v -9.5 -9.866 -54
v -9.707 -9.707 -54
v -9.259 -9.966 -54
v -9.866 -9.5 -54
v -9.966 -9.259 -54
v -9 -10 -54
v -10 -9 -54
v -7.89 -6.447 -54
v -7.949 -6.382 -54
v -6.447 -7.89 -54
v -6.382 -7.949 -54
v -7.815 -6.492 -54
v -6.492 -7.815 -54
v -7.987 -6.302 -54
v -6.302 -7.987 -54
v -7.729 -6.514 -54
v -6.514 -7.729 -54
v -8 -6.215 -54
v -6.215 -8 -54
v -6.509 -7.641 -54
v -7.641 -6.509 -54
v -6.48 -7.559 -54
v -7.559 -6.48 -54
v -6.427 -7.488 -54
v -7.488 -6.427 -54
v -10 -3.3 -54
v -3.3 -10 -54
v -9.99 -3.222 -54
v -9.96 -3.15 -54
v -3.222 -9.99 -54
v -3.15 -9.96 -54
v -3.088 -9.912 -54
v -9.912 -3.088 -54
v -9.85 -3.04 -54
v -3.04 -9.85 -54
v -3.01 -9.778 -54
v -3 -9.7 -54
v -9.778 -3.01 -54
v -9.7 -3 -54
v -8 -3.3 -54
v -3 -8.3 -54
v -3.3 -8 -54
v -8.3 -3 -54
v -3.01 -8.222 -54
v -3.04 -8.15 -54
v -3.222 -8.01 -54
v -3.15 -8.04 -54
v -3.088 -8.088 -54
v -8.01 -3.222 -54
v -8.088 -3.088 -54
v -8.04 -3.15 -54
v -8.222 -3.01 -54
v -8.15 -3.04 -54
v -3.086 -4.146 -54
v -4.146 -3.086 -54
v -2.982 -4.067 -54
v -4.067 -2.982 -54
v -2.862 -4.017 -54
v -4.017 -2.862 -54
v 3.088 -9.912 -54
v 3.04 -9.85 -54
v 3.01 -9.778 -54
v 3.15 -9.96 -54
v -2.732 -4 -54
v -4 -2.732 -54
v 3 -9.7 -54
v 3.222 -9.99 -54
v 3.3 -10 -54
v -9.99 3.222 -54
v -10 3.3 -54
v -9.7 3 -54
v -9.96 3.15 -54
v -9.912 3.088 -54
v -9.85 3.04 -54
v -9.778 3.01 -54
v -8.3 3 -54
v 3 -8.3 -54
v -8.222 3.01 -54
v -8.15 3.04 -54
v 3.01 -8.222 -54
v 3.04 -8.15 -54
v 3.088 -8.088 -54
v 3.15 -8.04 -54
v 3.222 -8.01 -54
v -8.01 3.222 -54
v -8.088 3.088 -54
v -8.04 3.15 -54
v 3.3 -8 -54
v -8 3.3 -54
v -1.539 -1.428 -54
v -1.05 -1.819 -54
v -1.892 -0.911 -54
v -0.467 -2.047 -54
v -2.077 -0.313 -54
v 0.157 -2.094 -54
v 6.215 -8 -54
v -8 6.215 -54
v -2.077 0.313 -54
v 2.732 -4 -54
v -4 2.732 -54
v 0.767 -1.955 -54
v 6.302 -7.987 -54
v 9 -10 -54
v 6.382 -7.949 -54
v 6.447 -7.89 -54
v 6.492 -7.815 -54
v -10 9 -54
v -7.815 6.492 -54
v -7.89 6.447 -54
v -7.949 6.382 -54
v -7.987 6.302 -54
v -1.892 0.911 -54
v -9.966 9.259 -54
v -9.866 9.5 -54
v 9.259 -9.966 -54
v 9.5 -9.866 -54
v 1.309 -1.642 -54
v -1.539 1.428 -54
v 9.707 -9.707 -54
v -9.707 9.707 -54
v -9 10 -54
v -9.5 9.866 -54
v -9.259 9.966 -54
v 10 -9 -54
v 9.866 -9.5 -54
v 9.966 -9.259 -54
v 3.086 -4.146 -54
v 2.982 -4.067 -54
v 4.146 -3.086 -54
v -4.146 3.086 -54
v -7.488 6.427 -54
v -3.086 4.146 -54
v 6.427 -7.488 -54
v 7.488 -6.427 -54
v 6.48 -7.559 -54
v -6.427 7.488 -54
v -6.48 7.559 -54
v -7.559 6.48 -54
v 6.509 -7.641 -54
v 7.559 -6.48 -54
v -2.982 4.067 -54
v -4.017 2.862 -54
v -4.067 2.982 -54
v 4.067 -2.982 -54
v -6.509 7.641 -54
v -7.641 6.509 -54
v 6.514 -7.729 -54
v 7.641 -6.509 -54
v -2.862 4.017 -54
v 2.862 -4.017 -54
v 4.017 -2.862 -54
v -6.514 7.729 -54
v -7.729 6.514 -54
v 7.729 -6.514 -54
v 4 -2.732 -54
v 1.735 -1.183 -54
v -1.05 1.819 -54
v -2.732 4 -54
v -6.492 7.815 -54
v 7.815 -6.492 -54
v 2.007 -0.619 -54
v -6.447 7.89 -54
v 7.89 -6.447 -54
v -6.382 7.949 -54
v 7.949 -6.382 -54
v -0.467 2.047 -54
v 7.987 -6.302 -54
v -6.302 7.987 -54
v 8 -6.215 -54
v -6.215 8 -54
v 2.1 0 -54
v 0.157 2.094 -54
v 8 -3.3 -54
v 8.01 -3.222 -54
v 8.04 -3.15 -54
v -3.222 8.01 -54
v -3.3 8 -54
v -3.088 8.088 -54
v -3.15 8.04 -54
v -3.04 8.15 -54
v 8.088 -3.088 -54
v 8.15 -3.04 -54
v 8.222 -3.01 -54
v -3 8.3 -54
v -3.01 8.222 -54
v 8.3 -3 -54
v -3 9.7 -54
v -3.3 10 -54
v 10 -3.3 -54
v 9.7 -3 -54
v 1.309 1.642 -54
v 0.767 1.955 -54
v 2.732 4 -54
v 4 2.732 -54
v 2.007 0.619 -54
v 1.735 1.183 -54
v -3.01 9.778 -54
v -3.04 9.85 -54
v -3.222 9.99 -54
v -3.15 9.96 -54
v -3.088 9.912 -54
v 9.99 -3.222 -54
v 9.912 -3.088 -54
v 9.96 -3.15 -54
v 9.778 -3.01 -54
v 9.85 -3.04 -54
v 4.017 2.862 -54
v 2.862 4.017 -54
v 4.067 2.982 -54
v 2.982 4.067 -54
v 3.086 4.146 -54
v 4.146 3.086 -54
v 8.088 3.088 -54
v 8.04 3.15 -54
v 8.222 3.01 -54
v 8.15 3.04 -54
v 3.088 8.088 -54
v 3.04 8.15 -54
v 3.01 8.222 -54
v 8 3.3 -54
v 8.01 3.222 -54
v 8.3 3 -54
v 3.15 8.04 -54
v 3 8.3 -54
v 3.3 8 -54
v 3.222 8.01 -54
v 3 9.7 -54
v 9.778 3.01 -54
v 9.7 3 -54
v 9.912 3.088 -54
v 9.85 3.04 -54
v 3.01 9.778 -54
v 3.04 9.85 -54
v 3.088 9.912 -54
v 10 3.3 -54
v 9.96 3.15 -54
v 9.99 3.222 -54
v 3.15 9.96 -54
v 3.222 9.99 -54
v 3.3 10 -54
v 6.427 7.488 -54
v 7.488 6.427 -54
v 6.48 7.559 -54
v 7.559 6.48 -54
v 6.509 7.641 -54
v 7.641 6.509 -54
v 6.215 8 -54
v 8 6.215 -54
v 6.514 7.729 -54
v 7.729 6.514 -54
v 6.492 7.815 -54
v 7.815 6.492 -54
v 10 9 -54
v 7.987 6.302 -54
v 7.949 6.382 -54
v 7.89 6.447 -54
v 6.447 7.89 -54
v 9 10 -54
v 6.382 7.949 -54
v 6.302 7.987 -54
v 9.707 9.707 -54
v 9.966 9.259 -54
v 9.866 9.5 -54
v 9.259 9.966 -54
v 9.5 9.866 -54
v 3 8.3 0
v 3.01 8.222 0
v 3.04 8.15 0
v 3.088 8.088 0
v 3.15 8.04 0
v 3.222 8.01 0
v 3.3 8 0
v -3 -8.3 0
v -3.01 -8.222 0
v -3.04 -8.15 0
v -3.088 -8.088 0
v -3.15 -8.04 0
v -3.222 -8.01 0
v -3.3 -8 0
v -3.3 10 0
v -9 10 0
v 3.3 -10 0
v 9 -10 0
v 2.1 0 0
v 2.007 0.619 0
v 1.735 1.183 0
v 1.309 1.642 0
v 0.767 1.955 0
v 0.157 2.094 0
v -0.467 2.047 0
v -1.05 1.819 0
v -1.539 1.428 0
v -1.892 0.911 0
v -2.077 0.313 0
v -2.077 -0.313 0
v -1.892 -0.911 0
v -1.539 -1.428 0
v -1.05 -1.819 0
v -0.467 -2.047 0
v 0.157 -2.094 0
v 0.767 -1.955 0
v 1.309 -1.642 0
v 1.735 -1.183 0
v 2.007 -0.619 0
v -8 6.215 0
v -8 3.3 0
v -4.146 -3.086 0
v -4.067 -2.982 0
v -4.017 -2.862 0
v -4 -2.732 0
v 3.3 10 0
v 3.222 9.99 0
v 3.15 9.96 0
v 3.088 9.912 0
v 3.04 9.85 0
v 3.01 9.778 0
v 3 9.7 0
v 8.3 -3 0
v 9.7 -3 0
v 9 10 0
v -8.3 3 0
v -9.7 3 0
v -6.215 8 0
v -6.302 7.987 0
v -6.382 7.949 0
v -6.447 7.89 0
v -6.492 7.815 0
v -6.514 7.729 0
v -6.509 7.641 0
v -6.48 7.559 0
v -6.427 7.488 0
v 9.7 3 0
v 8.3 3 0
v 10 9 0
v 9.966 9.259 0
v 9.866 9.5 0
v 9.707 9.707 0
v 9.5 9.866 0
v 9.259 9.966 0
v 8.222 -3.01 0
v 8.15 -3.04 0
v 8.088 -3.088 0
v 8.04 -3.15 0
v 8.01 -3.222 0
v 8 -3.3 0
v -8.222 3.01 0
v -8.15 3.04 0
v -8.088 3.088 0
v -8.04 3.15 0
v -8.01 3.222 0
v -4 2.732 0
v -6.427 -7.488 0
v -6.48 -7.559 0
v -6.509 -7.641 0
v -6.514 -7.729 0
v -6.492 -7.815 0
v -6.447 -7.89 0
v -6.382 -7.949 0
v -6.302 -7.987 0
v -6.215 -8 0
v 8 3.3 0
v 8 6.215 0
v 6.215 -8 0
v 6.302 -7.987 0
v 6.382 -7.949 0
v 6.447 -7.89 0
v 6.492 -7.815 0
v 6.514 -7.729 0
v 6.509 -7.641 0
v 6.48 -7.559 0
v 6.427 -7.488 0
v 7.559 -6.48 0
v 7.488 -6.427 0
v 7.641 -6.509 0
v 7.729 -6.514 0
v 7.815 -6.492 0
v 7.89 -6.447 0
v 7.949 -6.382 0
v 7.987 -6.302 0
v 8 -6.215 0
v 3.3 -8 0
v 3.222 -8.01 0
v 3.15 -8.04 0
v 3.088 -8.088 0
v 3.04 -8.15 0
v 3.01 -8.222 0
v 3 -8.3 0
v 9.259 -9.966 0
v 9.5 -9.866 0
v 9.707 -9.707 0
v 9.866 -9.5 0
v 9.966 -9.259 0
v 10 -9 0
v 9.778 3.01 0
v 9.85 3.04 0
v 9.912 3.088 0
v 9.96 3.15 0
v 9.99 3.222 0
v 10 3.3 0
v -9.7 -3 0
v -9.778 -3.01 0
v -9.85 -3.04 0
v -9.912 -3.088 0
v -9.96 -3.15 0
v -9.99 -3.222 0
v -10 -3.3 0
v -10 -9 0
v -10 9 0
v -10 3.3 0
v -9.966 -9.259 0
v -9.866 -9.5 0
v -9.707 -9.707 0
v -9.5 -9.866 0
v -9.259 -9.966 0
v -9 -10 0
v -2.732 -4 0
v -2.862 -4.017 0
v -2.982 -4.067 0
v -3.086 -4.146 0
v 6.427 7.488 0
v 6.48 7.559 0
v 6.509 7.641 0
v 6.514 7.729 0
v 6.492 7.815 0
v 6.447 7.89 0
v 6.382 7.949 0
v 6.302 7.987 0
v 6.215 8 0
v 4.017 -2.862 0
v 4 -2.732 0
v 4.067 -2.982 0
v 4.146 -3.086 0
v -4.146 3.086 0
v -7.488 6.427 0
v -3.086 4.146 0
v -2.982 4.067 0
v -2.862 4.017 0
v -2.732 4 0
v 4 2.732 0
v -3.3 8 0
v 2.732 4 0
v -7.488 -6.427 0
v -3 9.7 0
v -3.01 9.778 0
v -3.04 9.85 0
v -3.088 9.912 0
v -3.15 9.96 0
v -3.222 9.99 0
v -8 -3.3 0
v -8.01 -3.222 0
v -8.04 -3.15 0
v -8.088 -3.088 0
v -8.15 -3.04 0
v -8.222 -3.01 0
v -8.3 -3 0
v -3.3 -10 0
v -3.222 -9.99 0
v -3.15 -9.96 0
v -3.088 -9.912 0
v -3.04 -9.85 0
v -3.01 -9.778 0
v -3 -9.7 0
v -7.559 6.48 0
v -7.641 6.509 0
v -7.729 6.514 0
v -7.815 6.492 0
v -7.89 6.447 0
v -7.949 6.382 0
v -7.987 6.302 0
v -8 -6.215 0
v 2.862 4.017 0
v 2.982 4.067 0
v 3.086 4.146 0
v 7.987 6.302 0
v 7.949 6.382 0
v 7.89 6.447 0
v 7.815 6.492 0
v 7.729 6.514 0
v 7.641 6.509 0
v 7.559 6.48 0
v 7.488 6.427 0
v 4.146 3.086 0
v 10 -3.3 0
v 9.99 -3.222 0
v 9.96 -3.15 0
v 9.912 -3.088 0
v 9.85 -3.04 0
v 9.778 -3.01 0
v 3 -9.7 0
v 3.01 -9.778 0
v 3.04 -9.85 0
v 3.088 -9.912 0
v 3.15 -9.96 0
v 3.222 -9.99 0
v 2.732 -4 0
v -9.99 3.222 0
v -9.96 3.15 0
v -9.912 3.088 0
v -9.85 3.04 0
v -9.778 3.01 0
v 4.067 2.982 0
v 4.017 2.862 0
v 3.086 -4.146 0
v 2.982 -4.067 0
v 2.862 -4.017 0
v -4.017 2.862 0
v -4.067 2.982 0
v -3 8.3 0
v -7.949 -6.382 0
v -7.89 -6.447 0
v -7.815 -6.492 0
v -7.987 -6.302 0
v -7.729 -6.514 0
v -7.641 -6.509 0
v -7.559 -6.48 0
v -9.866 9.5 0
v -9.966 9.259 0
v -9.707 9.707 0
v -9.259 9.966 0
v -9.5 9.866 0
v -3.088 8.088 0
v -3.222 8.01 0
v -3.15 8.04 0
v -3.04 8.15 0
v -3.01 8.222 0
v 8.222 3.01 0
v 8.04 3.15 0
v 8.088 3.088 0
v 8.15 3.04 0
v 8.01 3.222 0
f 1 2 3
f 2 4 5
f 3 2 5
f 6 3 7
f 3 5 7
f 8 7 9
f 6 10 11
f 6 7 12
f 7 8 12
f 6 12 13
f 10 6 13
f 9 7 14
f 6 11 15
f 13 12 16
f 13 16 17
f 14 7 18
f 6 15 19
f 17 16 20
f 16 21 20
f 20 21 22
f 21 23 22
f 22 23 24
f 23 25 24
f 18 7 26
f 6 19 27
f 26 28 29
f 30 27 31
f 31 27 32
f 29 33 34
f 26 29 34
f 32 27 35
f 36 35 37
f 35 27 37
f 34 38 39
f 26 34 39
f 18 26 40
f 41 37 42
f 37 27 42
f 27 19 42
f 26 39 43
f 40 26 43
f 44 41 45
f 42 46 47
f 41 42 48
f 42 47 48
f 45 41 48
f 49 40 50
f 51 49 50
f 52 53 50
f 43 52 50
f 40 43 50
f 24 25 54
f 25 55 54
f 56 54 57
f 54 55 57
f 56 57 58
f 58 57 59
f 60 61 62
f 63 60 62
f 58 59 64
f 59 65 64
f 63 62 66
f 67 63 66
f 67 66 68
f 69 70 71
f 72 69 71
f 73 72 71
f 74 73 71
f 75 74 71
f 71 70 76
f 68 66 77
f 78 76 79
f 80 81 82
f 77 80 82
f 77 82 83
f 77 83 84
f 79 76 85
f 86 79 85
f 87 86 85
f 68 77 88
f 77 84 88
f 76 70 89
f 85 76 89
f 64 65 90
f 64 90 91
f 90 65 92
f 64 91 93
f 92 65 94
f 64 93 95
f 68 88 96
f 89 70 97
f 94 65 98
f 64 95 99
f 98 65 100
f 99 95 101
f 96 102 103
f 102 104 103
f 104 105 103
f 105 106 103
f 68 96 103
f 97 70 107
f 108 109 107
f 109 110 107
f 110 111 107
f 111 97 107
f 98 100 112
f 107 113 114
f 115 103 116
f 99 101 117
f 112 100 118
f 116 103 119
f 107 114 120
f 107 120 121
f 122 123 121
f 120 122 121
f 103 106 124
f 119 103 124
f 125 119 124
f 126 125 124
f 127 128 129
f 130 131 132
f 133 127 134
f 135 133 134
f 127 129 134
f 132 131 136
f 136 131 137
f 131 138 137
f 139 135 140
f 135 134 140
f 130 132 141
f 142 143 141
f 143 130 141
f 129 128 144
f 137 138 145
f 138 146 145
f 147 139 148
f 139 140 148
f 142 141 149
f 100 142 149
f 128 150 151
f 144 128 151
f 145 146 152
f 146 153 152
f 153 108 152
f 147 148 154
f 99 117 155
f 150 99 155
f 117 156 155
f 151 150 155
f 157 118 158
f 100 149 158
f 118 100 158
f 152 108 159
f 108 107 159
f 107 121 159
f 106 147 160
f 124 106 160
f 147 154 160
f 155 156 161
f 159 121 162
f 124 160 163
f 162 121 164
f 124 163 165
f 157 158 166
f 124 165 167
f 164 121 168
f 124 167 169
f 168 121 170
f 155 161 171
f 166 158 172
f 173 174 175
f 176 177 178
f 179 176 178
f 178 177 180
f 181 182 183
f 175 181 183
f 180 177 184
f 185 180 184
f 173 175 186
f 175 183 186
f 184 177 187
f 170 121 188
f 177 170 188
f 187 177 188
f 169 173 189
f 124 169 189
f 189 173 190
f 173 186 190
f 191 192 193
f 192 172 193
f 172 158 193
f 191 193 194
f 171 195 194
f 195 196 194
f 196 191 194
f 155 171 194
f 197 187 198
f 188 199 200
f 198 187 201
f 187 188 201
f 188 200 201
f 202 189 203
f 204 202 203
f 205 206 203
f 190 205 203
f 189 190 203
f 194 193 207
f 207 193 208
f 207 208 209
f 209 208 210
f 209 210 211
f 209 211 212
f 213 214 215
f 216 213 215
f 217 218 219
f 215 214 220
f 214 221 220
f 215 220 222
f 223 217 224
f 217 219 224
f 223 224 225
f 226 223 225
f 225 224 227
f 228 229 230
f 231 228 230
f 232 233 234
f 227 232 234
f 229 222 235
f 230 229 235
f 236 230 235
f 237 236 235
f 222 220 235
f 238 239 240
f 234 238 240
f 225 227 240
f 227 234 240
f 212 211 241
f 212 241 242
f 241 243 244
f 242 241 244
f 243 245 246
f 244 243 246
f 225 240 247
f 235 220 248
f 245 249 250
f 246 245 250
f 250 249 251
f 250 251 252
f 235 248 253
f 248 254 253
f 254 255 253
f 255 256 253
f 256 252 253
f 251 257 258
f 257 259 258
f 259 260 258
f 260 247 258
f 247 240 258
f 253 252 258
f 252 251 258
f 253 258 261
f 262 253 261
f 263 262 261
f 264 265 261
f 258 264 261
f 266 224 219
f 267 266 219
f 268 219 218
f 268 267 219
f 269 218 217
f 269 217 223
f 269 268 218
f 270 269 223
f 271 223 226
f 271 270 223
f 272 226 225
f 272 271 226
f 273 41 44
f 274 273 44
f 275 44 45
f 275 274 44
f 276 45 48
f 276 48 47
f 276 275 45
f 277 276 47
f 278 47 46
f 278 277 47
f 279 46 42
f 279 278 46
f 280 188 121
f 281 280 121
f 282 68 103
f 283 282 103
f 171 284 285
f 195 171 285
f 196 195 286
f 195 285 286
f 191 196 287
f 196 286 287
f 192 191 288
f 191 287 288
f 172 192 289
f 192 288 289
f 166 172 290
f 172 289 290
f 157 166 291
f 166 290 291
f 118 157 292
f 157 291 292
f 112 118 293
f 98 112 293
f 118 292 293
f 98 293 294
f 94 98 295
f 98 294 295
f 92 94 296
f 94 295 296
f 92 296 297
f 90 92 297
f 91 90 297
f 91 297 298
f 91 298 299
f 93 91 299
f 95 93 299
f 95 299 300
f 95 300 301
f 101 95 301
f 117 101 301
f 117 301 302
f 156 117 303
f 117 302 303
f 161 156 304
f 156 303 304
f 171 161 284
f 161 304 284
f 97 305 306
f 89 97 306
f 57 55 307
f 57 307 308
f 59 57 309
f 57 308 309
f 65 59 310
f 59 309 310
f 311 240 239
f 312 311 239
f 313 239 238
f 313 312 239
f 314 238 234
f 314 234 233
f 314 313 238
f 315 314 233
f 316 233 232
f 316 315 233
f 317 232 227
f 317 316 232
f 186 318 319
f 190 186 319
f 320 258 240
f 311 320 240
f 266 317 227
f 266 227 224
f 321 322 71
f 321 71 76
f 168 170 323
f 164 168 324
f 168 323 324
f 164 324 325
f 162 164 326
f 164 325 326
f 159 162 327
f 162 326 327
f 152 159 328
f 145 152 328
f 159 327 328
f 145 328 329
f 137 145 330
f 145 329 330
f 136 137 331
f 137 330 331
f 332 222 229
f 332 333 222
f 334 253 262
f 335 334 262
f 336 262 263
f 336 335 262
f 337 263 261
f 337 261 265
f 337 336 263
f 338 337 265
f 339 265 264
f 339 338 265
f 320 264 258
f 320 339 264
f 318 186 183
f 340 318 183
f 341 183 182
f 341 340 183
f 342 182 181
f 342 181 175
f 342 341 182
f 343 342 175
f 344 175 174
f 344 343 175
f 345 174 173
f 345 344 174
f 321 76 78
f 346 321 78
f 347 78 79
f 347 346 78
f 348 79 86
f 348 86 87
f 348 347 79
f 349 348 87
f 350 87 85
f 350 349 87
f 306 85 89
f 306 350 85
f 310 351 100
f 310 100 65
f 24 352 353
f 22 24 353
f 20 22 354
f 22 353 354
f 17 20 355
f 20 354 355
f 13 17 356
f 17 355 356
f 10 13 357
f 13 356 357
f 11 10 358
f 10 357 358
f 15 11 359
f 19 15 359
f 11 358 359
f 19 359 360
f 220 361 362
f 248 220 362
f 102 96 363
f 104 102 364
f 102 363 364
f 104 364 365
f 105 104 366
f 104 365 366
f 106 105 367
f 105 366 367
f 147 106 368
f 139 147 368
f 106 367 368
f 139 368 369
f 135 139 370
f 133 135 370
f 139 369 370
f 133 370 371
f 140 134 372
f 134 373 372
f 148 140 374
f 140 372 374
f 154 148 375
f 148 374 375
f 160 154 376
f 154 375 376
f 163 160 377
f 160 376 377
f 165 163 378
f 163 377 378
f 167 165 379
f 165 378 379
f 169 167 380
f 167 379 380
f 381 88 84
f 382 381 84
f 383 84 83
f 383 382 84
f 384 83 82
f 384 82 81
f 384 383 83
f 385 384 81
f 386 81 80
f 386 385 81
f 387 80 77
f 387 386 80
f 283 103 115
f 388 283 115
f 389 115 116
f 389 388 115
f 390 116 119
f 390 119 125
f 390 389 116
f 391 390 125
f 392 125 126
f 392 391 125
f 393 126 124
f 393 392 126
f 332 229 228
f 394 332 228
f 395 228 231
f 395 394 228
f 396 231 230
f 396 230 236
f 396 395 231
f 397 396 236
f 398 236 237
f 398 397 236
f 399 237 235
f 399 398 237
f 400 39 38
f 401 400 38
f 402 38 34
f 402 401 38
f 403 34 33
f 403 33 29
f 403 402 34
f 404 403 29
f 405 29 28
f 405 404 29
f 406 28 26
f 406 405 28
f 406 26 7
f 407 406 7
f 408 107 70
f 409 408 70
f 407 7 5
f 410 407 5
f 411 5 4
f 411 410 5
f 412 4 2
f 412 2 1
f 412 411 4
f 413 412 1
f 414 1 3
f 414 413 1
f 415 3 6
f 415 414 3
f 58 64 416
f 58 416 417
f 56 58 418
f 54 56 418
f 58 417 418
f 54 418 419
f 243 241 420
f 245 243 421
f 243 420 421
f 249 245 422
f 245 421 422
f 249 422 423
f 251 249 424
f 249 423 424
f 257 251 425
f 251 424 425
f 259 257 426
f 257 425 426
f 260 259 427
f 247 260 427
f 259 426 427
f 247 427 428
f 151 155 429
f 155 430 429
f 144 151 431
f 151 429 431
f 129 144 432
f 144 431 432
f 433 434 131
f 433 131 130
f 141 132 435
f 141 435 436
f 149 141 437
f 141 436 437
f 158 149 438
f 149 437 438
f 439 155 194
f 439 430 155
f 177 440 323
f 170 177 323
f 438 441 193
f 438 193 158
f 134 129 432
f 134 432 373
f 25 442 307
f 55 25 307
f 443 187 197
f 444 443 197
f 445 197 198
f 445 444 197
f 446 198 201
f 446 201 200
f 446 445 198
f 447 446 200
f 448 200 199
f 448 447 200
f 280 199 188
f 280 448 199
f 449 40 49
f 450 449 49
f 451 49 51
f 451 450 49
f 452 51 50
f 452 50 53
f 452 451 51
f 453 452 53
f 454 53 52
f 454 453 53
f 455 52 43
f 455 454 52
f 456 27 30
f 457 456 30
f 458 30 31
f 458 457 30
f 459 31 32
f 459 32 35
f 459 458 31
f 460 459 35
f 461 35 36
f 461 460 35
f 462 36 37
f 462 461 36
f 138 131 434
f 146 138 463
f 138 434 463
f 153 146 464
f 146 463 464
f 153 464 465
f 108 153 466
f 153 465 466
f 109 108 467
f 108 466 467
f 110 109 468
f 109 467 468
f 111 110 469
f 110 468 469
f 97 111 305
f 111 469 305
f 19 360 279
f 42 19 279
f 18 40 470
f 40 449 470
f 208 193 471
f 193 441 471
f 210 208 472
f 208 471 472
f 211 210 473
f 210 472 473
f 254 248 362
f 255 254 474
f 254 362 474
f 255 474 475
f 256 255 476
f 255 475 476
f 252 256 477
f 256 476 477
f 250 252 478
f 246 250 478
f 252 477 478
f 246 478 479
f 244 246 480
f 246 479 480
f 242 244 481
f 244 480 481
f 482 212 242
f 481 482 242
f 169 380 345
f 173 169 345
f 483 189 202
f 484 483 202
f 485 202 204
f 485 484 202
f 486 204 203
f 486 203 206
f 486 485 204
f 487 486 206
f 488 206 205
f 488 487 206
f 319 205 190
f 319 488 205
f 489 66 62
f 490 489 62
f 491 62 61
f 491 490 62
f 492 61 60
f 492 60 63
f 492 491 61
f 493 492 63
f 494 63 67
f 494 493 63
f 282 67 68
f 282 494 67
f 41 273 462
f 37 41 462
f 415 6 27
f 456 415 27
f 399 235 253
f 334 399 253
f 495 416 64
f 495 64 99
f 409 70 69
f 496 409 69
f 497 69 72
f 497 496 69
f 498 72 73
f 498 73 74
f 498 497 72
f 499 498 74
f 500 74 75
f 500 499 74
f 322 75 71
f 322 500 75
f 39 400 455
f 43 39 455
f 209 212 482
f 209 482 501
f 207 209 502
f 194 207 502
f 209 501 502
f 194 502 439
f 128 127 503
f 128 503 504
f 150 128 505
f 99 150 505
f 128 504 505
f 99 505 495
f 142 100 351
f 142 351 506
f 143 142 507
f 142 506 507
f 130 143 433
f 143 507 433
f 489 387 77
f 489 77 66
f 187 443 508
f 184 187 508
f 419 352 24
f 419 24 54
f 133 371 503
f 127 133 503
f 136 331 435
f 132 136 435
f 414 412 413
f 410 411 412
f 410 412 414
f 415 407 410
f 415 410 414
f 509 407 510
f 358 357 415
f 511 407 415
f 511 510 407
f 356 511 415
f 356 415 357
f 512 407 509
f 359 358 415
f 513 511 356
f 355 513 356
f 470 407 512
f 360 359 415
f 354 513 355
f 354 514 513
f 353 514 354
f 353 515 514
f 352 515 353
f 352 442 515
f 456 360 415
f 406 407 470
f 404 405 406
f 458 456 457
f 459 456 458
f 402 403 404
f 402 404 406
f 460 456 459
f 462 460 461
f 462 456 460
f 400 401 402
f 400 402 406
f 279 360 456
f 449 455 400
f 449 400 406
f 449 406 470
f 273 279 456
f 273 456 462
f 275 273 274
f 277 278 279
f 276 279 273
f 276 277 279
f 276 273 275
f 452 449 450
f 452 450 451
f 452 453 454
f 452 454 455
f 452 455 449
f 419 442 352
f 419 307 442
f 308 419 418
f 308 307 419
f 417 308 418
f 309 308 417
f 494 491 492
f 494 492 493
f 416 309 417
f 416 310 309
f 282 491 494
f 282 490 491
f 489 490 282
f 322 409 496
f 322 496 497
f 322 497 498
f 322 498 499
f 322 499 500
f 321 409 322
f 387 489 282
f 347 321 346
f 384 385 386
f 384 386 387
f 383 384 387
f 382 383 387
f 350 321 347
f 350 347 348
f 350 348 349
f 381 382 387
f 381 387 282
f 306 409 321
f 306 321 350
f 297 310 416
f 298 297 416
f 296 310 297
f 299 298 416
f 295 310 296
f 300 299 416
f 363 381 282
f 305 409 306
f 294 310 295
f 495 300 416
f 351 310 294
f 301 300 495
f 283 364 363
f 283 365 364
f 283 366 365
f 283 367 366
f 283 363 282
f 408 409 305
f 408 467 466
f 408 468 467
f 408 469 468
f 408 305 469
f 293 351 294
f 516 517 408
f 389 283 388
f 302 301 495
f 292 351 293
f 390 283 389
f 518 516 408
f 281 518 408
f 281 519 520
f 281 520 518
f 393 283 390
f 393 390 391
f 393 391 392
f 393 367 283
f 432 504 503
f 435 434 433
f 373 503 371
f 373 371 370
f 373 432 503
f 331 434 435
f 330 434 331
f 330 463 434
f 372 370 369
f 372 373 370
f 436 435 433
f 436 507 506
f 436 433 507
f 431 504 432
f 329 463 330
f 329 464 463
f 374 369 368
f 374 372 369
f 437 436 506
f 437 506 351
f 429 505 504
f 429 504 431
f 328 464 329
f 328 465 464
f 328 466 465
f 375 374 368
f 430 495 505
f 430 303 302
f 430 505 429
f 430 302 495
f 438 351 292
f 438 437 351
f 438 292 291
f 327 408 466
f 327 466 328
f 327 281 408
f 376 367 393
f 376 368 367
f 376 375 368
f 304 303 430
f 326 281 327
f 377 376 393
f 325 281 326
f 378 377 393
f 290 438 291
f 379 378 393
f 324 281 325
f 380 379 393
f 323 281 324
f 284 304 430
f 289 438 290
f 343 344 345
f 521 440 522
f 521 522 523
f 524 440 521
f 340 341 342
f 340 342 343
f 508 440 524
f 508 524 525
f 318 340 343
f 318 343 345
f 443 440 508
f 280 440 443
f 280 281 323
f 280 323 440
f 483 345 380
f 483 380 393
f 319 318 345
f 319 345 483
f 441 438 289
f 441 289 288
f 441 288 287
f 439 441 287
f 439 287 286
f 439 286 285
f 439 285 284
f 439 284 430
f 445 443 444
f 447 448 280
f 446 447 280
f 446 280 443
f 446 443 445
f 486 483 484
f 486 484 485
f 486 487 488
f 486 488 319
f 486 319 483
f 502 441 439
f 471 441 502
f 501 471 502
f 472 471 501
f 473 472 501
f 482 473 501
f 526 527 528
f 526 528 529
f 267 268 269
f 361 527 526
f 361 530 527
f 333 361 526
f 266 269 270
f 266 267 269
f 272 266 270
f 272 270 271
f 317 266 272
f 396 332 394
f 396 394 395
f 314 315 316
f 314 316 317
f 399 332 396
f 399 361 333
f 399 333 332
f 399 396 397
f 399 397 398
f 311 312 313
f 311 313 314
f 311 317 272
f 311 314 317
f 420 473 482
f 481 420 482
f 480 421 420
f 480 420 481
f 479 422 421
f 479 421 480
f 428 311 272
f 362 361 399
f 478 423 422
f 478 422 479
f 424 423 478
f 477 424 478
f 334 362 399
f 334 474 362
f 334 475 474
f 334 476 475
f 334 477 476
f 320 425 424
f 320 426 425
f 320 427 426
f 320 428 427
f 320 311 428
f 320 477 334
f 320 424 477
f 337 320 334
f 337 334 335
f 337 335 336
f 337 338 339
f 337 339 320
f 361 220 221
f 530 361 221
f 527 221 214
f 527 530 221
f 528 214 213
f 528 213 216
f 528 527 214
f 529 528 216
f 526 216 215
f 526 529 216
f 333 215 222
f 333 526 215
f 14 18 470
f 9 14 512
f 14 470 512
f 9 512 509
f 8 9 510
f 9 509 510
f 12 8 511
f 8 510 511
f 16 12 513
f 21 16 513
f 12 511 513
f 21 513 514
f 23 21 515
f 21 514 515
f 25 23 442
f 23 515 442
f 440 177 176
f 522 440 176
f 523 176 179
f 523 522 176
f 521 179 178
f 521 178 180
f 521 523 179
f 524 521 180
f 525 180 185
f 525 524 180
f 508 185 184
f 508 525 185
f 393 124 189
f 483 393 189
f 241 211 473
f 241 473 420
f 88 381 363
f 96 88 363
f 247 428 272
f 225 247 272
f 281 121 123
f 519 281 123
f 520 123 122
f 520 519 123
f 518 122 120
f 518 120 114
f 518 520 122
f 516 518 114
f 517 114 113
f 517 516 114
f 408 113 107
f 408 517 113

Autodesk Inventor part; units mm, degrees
ref_plane "YZ Plane" through (0, 0, 0) normal (1, 0, 0) x (0, 1, 0)
ref_plane "XZ Plane" through (0, 0, 0) normal (0, 1, 0) x (-1, 0, 0)
ref_plane "XY Plane" through (0, 0, 0) normal (0, 0, 1) x (1, 0, 0)
sketch "Skizze1" plane through (0, 0, 0) normal (0, 0, 1) x (1, 0, 0)
  line L0 (-20.0059, 0) -> (20.0059, 0) projected
  line L1 (0, -20.0059) -> (0, 20.0059) projected
  line L2 (-14.2899, 0) -> (14.2899, 0)
  line L3 (0, -14.2899) -> (0, 14.2899)
  line L4 (-10, -10) -> (10, 10) construction
  line L5 (10, -10) -> (-10, 10) construction
  line L6 (-8, -8) -> (8, 8) construction
  line L7 (8, -8) -> (-8, 8) construction
  line L8 (-2.7322, -4) -> (2.7322, -4)
  line L9 (4, -2.7322) -> (4, 2.7322)
  line L10 (2.7322, 4) -> (-2.7322, 4)
  line L11 (-4, 2.7322) -> (-4, -2.7322)
  line L12 (-4, -4) -> (4, 4) construction
  line L13 (4, -4) -> (-4, 4) construction
  arc A0 (-9, 10) -> (-10, 9) centre (-9, 9) ccw
  arc A1 (10, 9) -> (9, 10) centre (9, 9) ccw
  arc A2 (9, -10) -> (10, -9) centre (9, -9) ccw
  arc A3 (-10, -9) -> (-9, -10) centre (-9, -9) ccw
  line L14 (-3, 9.7) -> (-3, 8.3)
  line L15 (3, 9.7) -> (3, 8.3)
  line L16 (6.2151, 8) -> (3.3, 8)
  line L17 (-3.3, 8) -> (-6.2151, 8)
  line L18 (9, 10) -> (3.3, 10)
  line L19 (-3.3, 10) -> (-9, 10)
  line L20 (-9.7, -3) -> (-8.3, -3)
  line L21 (-9.7, 3) -> (-8.3, 3)
  line L22 (-8, 6.2151) -> (-8, 3.3)
  line L23 (-8, -3.3) -> (-8, -6.2151)
  line L24 (-10, 9) -> (-10, 3.3)
  line L25 (-10, -3.3) -> (-10, -9)
  line L26 (-3, -8.3) -> (-3, -9.7)
  line L27 (3, -8.3) -> (3, -9.7)
  line L28 (-9, -10) -> (-3.3, -10)
  line L29 (3.3, -10) -> (9, -10)
  line L30 (-6.2151, -8) -> (-3.3, -8)
  line L31 (3.3, -8) -> (6.2151, -8)
  line L32 (8.3, 3) -> (9.7, 3)
  line L33 (8.3, -3) -> (9.7, -3)
  line L34 (8, -6.2151) -> (8, -3.3)
  line L35 (8, 3.3) -> (8, 6.2151)
  line L36 (10, -9) -> (10, -3.3)
  line L37 (10, 3.3) -> (10, 9)
  arc A4 (-10, 3.3) -> (-9.7, 3) centre (-9.7, 3.3) ccw
  arc A5 (-8.3, 3) -> (-8, 3.3) centre (-8.3, 3.3) ccw
  arc A6 (-9.7, -3) -> (-10, -3.3) centre (-9.7, -3.3) ccw
  arc A7 (-8, -3.3) -> (-8.3, -3) centre (-8.3, -3.3) ccw
  arc A8 (-3.3, -10) -> (-3, -9.7) centre (-3.3, -9.7) ccw
  arc A9 (-3, -8.3) -> (-3.3, -8) centre (-3.3, -8.3) ccw
  arc A10 (3, -9.7) -> (3.3, -10) centre (3.3, -9.7) ccw
  arc A11 (3.3, -8) -> (3, -8.3) centre (3.3, -8.3) ccw
  arc A12 (8.3, -3) -> (8, -3.3) centre (8.3, -3.3) ccw
  arc A13 (10, -3.3) -> (9.7, -3) centre (9.7, -3.3) ccw
  arc A14 (8, 3.3) -> (8.3, 3) centre (8.3, 3.3) ccw
  arc A15 (9.7, 3) -> (10, 3.3) centre (9.7, 3.3) ccw
  arc A16 (3, 8.3) -> (3.3, 8) centre (3.3, 8.3) ccw
  arc A17 (3.3, 10) -> (3, 9.7) centre (3.3, 9.7) ccw
  arc A18 (-3.3, 8) -> (-3, 8.3) centre (-3.3, 8.3) ccw
  arc A19 (-3, 9.7) -> (-3.3, 10) centre (-3.3, 9.7) ccw
  line L38 (-7.4879, 6.4272) -> (-4.1464, 3.0858)
  line L39 (-6.4272, 7.4879) -> (-3.0858, 4.1464)
  line L40 (-6.4272, -7.4879) -> (-3.0858, -4.1464)
  line L41 (-7.4879, -6.4272) -> (-4.1464, -3.0858)
  arc A20 (-7.4879, 6.4272) -> (-8, 6.2151) centre (-7.7, 6.2151) ccw
  arc A21 (-6.2151, 8) -> (-6.4272, 7.4879) centre (-6.2151, 7.7) ccw
  arc A22 (-8, -6.2151) -> (-7.4879, -6.4272) centre (-7.7, -6.2151) ccw
  arc A23 (-6.4272, -7.4879) -> (-6.2151, -8) centre (-6.2151, -7.7) ccw
  line L42 (6.4272, -7.4879) -> (3.0858, -4.1464)
  line L43 (4.1464, -3.0858) -> (7.4879, -6.4272)
  arc A24 (6.2151, -8) -> (6.4272, -7.4879) centre (6.2151, -7.7) ccw
  arc A25 (7.4879, -6.4272) -> (8, -6.2151) centre (7.7, -6.2151) ccw
  line L44 (4.1464, 3.0858) -> (7.4879, 6.4272)
  line L45 (3.0858, 4.1464) -> (6.4272, 7.4879)
  arc A26 (6.4272, 7.4879) -> (6.2151, 8) centre (6.2151, 7.7) ccw
  arc A27 (8, 6.2151) -> (7.4879, 6.4272) centre (7.7, 6.2151) ccw
  arc A28 (-3.0858, 4.1464) -> (-2.7322, 4) centre (-2.7322, 4.5) ccw
  arc A29 (-4, 2.7322) -> (-4.1464, 3.0858) centre (-4.5, 2.7322) ccw
  arc A30 (2.7322, 4) -> (3.0858, 4.1464) centre (2.7322, 4.5) ccw
  arc A31 (4.1464, 3.0858) -> (4, 2.7322) centre (4.5, 2.7322) ccw
  arc A32 (-4.1464, -3.0858) -> (-4, -2.7322) centre (-4.5, -2.7322) ccw
  arc A33 (-2.7322, -4) -> (-3.0858, -4.1464) centre (-2.7322, -4.5) ccw
  arc A34 (3.0858, -4.1464) -> (2.7322, -4) centre (2.7322, -4.5) ccw
  arc A35 (4, -2.7322) -> (4.1464, -3.0858) centre (4.5, -2.7322) ccw
  circle A36 centre (0, 0) radius 2.1
  point P0 (3, 8.9014)
  point P1 (-3, 9.1415)
  point P2 (-8.9764, -3)
  point P3 (-9.1265, 3)
  point P4 (3, -9.1251)
  point P5 (-3, -9.1251)
  point P6 (9.1101, -3)
  point P7 (9.1101, 3)
  dimension "d0" = 20
  dimension "d1" = 20
  dimension "d2" = 16
  dimension "d3" = 16
  dimension "d4" = 8
  dimension "d5" = 8
  dimension "d6" = 1
  dimension "d7" = 6
  dimension "d8" = 6
  dimension "d9" = 6
  dimension "d10" = 6
  dimension "d11" = 0.3
  dimension "d12" = 1.5
  dimension "d13" = 1.5
  dimension "d14" = 0.3
  dimension "d15" = 1.5
  dimension "d16" = 0.3
  dimension "d17" = 1.5
  dimension "d18" = 0.3
  dimension "d19" = 0.5
  dimension "d20" = 4.2
  dimension "d21" = 45
  dimension "d22" = 10
  dimension "d23" = 10
  dimension "d24" = 4
  dimension "d25" = 4
  dimension "d26" = 10
  dimension "d27" = 8
  dimension "d28" = 4
  dimension "d29" = 4
  dimension "d30" = 10
  dimension "d31" = 9.1101
  dimension "d32" = 8
  dimension "d33" = 4
  dimension "d34" = 8.9014
  dimension "d35" = 9.1251
  dimension "d36" = 9.1415
  dimension "d37" = 8.9764
  dimension "d38" = 9.1265
extrude "Extrusion1" add sketch "Skizze1" against normal blind 54 contours L11 A29 L38 A20 L22 A5 L21 A4 L24 A0 L19 A19 L14 A18 L17 A21 L39 A28 L10 L1 A36 L0 | L0 A36 L1 L8 A33 L40 A23 L30 A9 L26 A8 L28 A3 L25 A6 L20 A7 L23 A22 L41 A32 L11 | L1 L10 A30 L45 A26 L16 A16 L15 A17 L18 A1 L37 A15 L32 A14 L35 A27 L44 A31 L9 L0 A36 | A36 L0 L9 A35 L43 A25 L34 A12 L33 A13 L36 A2 L29 A10 L27 A11 L31 A24 L42 A34 L8 L1
properties part number "I Strebe Motorhalterung waagecht" material "Aluminium 6061"
